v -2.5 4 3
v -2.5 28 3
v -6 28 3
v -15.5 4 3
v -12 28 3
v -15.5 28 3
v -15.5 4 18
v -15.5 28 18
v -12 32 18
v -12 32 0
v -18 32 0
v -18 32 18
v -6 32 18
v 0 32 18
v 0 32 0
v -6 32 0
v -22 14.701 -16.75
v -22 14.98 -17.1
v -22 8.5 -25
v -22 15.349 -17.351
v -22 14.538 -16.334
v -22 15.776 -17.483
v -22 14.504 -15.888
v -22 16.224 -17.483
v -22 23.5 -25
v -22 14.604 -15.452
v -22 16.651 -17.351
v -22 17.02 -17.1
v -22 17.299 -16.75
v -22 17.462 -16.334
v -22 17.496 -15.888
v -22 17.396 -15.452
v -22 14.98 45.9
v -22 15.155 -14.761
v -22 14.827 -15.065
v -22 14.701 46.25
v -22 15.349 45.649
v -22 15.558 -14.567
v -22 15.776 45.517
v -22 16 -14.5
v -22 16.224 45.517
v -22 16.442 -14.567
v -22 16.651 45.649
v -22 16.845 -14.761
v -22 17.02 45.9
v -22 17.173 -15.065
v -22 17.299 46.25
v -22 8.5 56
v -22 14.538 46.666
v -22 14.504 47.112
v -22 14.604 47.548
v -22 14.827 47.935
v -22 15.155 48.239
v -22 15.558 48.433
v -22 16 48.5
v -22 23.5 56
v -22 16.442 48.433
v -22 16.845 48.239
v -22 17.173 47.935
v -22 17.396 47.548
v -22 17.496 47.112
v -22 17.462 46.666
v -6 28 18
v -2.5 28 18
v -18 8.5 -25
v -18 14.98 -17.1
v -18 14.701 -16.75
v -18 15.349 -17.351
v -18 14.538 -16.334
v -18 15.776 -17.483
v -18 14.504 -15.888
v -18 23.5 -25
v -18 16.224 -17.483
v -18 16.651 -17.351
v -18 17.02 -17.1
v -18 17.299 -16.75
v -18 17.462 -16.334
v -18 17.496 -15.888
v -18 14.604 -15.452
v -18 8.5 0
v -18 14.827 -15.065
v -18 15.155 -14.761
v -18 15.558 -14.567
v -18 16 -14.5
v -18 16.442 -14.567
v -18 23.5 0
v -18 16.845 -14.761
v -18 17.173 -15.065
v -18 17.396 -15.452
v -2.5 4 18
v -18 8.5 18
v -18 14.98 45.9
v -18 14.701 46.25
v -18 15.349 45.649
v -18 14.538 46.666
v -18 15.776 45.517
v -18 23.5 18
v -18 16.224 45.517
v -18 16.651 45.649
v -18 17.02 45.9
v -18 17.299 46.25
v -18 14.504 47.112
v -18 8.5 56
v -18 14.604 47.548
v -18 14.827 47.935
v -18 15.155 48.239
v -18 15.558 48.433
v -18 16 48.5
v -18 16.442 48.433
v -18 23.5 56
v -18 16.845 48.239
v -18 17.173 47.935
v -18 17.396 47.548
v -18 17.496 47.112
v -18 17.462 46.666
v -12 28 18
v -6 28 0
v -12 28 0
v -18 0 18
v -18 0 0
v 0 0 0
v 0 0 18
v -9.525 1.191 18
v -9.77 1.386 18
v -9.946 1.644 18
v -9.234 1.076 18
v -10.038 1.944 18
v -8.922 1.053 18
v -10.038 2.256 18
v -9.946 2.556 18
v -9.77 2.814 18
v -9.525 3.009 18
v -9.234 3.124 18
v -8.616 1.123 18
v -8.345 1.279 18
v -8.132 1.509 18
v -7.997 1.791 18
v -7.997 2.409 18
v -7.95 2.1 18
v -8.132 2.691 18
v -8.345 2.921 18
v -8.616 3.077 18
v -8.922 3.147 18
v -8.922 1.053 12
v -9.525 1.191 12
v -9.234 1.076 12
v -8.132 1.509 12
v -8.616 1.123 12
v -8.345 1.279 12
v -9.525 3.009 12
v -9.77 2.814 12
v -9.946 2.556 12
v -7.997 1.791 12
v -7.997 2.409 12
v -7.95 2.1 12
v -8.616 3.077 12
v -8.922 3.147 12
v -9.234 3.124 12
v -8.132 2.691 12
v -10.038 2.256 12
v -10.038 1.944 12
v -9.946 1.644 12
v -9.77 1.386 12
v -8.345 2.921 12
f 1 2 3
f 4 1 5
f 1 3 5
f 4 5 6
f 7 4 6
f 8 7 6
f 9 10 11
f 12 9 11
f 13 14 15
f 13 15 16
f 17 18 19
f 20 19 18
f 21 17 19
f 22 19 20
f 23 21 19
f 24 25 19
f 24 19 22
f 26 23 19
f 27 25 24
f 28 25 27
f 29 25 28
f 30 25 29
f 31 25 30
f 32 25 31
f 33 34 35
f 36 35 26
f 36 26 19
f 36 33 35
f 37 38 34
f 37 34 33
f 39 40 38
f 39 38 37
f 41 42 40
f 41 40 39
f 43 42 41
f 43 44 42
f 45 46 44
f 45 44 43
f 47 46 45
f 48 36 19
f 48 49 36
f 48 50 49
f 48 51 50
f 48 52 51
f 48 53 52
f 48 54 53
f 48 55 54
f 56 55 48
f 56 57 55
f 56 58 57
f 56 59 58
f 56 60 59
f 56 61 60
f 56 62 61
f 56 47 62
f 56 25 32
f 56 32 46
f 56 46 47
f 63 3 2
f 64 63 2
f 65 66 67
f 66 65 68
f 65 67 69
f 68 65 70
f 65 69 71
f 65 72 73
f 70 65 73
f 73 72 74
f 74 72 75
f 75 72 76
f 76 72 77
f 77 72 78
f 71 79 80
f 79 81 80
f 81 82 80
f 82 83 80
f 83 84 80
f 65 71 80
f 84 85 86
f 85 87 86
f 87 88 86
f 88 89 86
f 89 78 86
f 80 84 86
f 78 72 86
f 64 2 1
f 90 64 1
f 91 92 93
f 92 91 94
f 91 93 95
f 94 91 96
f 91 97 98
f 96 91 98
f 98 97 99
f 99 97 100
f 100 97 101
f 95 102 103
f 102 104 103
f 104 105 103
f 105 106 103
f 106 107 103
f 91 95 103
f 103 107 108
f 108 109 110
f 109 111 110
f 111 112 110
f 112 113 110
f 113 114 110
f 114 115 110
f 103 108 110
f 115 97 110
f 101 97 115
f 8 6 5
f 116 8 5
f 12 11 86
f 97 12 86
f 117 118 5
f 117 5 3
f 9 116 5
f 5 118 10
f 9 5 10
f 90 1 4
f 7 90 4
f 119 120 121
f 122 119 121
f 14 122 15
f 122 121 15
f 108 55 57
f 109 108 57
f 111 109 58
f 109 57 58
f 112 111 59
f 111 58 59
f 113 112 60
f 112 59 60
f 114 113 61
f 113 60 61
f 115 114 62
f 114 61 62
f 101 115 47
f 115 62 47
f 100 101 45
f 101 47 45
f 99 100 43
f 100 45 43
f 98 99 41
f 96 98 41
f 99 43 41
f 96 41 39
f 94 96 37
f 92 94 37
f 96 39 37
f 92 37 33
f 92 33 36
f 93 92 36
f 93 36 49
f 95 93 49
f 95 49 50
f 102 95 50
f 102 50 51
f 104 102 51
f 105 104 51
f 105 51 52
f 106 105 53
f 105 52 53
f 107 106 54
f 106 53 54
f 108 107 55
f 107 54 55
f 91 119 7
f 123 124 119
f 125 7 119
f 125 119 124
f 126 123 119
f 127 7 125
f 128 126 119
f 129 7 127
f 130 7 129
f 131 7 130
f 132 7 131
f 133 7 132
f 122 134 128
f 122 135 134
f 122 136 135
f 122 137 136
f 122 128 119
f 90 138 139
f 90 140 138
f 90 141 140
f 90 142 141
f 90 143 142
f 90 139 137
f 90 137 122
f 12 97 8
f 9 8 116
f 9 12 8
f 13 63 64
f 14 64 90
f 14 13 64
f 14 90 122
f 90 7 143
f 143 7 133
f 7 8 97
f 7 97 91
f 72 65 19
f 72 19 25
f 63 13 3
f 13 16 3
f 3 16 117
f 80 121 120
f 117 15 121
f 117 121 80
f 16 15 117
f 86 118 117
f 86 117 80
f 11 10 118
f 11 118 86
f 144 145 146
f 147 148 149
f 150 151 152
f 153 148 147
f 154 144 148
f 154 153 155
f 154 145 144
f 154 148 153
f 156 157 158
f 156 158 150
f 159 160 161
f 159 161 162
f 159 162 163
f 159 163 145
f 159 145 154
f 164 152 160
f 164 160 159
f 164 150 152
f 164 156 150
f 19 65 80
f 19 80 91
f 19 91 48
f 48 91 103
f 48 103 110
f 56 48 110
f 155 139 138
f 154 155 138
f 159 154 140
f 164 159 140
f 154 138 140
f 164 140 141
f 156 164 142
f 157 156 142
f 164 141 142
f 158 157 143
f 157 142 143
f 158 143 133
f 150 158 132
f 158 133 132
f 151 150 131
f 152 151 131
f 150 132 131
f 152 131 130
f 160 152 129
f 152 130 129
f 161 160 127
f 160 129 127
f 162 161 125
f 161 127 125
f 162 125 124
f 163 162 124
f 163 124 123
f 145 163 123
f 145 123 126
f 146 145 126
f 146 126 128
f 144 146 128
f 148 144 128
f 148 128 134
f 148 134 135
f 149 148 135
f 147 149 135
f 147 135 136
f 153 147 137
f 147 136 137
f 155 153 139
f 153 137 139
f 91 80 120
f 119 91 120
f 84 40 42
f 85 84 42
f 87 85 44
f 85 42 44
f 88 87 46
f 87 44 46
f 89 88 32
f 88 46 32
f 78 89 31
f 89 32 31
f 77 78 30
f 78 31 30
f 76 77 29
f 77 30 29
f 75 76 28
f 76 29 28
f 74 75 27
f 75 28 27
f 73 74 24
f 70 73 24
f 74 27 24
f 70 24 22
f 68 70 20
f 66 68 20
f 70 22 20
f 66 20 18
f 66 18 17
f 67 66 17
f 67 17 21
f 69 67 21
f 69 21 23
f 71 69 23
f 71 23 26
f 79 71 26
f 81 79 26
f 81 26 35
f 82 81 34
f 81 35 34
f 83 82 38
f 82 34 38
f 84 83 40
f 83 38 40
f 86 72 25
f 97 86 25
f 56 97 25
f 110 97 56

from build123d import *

# Parameters (mm, degrees)
BOSS_EXTRU_1_DEPTH      = 3
BOSS_EXTRU_2_DEPTH      = 15
ESQUISSE3_R             = 1.05
ENL_V_MAT_EXTRU_1_DEPTH = 6
ESQUISSE4_W             = 81
ESQUISSE4_H             = 15
BOSS_EXTRU_3_DEPTH      = 4
ESQUISSE5_R             = 1.5
ENL_V_MAT_EXTRU_2_DEPTH = 4


with BuildPart() as part:
    # Esquisse1 → Boss.-Extru.1 (new body)
    with BuildSketch(Plane.XY):
        Polygon((-12, 32), (-12, 28), (-6, 28), (-6, 32), (0, 32), (0, 0), (-18, 0), (-18, 32), align=None)
    extrude(amount=BOSS_EXTRU_1_DEPTH)

    # Esquisse2 → Boss.-Extru.2 (add)
    with BuildSketch(Plane.XY.offset(3)):
        Polygon((-18, 0), (0, 0), (0, 32), (-6, 32), (-6, 28), (-2.5, 28), (-2.5, 4), (-15.5, 4), (-15.5, 28), (-12, 28), (-12, 32), (-18, 32), align=None)
    extrude(amount=BOSS_EXTRU_2_DEPTH)

    # Esquisse3 → Enlèv. mat.-Extru.1 (cut)
    with BuildSketch(Plane.XY.offset(18)):
        with Locations((-9, 2.1)):
            Circle(ESQUISSE3_R)
    extrude(amount=-ENL_V_MAT_EXTRU_1_DEPTH, mode=Mode.SUBTRACT)

    # Esquisse4 → Boss.-Extru.3 (add)
    with BuildSketch(Plane.ZY.offset(18)):
        with Locations((15.5, 16)):
            Rectangle(ESQUISSE4_W, ESQUISSE4_H)
    extrude(amount=BOSS_EXTRU_3_DEPTH)

    # Esquisse5 → Enlèv. mat.-Extru.2 (cut)
    with BuildSketch(Plane.ZY.offset(22)):
        with Locations((-16, 16)):
            Circle(ESQUISSE5_R)
        with Locations((47, 16)):
            Circle(ESQUISSE5_R)
    extrude(amount=-ENL_V_MAT_EXTRU_2_DEPTH, mode=Mode.SUBTRACT)


solid = part.part
